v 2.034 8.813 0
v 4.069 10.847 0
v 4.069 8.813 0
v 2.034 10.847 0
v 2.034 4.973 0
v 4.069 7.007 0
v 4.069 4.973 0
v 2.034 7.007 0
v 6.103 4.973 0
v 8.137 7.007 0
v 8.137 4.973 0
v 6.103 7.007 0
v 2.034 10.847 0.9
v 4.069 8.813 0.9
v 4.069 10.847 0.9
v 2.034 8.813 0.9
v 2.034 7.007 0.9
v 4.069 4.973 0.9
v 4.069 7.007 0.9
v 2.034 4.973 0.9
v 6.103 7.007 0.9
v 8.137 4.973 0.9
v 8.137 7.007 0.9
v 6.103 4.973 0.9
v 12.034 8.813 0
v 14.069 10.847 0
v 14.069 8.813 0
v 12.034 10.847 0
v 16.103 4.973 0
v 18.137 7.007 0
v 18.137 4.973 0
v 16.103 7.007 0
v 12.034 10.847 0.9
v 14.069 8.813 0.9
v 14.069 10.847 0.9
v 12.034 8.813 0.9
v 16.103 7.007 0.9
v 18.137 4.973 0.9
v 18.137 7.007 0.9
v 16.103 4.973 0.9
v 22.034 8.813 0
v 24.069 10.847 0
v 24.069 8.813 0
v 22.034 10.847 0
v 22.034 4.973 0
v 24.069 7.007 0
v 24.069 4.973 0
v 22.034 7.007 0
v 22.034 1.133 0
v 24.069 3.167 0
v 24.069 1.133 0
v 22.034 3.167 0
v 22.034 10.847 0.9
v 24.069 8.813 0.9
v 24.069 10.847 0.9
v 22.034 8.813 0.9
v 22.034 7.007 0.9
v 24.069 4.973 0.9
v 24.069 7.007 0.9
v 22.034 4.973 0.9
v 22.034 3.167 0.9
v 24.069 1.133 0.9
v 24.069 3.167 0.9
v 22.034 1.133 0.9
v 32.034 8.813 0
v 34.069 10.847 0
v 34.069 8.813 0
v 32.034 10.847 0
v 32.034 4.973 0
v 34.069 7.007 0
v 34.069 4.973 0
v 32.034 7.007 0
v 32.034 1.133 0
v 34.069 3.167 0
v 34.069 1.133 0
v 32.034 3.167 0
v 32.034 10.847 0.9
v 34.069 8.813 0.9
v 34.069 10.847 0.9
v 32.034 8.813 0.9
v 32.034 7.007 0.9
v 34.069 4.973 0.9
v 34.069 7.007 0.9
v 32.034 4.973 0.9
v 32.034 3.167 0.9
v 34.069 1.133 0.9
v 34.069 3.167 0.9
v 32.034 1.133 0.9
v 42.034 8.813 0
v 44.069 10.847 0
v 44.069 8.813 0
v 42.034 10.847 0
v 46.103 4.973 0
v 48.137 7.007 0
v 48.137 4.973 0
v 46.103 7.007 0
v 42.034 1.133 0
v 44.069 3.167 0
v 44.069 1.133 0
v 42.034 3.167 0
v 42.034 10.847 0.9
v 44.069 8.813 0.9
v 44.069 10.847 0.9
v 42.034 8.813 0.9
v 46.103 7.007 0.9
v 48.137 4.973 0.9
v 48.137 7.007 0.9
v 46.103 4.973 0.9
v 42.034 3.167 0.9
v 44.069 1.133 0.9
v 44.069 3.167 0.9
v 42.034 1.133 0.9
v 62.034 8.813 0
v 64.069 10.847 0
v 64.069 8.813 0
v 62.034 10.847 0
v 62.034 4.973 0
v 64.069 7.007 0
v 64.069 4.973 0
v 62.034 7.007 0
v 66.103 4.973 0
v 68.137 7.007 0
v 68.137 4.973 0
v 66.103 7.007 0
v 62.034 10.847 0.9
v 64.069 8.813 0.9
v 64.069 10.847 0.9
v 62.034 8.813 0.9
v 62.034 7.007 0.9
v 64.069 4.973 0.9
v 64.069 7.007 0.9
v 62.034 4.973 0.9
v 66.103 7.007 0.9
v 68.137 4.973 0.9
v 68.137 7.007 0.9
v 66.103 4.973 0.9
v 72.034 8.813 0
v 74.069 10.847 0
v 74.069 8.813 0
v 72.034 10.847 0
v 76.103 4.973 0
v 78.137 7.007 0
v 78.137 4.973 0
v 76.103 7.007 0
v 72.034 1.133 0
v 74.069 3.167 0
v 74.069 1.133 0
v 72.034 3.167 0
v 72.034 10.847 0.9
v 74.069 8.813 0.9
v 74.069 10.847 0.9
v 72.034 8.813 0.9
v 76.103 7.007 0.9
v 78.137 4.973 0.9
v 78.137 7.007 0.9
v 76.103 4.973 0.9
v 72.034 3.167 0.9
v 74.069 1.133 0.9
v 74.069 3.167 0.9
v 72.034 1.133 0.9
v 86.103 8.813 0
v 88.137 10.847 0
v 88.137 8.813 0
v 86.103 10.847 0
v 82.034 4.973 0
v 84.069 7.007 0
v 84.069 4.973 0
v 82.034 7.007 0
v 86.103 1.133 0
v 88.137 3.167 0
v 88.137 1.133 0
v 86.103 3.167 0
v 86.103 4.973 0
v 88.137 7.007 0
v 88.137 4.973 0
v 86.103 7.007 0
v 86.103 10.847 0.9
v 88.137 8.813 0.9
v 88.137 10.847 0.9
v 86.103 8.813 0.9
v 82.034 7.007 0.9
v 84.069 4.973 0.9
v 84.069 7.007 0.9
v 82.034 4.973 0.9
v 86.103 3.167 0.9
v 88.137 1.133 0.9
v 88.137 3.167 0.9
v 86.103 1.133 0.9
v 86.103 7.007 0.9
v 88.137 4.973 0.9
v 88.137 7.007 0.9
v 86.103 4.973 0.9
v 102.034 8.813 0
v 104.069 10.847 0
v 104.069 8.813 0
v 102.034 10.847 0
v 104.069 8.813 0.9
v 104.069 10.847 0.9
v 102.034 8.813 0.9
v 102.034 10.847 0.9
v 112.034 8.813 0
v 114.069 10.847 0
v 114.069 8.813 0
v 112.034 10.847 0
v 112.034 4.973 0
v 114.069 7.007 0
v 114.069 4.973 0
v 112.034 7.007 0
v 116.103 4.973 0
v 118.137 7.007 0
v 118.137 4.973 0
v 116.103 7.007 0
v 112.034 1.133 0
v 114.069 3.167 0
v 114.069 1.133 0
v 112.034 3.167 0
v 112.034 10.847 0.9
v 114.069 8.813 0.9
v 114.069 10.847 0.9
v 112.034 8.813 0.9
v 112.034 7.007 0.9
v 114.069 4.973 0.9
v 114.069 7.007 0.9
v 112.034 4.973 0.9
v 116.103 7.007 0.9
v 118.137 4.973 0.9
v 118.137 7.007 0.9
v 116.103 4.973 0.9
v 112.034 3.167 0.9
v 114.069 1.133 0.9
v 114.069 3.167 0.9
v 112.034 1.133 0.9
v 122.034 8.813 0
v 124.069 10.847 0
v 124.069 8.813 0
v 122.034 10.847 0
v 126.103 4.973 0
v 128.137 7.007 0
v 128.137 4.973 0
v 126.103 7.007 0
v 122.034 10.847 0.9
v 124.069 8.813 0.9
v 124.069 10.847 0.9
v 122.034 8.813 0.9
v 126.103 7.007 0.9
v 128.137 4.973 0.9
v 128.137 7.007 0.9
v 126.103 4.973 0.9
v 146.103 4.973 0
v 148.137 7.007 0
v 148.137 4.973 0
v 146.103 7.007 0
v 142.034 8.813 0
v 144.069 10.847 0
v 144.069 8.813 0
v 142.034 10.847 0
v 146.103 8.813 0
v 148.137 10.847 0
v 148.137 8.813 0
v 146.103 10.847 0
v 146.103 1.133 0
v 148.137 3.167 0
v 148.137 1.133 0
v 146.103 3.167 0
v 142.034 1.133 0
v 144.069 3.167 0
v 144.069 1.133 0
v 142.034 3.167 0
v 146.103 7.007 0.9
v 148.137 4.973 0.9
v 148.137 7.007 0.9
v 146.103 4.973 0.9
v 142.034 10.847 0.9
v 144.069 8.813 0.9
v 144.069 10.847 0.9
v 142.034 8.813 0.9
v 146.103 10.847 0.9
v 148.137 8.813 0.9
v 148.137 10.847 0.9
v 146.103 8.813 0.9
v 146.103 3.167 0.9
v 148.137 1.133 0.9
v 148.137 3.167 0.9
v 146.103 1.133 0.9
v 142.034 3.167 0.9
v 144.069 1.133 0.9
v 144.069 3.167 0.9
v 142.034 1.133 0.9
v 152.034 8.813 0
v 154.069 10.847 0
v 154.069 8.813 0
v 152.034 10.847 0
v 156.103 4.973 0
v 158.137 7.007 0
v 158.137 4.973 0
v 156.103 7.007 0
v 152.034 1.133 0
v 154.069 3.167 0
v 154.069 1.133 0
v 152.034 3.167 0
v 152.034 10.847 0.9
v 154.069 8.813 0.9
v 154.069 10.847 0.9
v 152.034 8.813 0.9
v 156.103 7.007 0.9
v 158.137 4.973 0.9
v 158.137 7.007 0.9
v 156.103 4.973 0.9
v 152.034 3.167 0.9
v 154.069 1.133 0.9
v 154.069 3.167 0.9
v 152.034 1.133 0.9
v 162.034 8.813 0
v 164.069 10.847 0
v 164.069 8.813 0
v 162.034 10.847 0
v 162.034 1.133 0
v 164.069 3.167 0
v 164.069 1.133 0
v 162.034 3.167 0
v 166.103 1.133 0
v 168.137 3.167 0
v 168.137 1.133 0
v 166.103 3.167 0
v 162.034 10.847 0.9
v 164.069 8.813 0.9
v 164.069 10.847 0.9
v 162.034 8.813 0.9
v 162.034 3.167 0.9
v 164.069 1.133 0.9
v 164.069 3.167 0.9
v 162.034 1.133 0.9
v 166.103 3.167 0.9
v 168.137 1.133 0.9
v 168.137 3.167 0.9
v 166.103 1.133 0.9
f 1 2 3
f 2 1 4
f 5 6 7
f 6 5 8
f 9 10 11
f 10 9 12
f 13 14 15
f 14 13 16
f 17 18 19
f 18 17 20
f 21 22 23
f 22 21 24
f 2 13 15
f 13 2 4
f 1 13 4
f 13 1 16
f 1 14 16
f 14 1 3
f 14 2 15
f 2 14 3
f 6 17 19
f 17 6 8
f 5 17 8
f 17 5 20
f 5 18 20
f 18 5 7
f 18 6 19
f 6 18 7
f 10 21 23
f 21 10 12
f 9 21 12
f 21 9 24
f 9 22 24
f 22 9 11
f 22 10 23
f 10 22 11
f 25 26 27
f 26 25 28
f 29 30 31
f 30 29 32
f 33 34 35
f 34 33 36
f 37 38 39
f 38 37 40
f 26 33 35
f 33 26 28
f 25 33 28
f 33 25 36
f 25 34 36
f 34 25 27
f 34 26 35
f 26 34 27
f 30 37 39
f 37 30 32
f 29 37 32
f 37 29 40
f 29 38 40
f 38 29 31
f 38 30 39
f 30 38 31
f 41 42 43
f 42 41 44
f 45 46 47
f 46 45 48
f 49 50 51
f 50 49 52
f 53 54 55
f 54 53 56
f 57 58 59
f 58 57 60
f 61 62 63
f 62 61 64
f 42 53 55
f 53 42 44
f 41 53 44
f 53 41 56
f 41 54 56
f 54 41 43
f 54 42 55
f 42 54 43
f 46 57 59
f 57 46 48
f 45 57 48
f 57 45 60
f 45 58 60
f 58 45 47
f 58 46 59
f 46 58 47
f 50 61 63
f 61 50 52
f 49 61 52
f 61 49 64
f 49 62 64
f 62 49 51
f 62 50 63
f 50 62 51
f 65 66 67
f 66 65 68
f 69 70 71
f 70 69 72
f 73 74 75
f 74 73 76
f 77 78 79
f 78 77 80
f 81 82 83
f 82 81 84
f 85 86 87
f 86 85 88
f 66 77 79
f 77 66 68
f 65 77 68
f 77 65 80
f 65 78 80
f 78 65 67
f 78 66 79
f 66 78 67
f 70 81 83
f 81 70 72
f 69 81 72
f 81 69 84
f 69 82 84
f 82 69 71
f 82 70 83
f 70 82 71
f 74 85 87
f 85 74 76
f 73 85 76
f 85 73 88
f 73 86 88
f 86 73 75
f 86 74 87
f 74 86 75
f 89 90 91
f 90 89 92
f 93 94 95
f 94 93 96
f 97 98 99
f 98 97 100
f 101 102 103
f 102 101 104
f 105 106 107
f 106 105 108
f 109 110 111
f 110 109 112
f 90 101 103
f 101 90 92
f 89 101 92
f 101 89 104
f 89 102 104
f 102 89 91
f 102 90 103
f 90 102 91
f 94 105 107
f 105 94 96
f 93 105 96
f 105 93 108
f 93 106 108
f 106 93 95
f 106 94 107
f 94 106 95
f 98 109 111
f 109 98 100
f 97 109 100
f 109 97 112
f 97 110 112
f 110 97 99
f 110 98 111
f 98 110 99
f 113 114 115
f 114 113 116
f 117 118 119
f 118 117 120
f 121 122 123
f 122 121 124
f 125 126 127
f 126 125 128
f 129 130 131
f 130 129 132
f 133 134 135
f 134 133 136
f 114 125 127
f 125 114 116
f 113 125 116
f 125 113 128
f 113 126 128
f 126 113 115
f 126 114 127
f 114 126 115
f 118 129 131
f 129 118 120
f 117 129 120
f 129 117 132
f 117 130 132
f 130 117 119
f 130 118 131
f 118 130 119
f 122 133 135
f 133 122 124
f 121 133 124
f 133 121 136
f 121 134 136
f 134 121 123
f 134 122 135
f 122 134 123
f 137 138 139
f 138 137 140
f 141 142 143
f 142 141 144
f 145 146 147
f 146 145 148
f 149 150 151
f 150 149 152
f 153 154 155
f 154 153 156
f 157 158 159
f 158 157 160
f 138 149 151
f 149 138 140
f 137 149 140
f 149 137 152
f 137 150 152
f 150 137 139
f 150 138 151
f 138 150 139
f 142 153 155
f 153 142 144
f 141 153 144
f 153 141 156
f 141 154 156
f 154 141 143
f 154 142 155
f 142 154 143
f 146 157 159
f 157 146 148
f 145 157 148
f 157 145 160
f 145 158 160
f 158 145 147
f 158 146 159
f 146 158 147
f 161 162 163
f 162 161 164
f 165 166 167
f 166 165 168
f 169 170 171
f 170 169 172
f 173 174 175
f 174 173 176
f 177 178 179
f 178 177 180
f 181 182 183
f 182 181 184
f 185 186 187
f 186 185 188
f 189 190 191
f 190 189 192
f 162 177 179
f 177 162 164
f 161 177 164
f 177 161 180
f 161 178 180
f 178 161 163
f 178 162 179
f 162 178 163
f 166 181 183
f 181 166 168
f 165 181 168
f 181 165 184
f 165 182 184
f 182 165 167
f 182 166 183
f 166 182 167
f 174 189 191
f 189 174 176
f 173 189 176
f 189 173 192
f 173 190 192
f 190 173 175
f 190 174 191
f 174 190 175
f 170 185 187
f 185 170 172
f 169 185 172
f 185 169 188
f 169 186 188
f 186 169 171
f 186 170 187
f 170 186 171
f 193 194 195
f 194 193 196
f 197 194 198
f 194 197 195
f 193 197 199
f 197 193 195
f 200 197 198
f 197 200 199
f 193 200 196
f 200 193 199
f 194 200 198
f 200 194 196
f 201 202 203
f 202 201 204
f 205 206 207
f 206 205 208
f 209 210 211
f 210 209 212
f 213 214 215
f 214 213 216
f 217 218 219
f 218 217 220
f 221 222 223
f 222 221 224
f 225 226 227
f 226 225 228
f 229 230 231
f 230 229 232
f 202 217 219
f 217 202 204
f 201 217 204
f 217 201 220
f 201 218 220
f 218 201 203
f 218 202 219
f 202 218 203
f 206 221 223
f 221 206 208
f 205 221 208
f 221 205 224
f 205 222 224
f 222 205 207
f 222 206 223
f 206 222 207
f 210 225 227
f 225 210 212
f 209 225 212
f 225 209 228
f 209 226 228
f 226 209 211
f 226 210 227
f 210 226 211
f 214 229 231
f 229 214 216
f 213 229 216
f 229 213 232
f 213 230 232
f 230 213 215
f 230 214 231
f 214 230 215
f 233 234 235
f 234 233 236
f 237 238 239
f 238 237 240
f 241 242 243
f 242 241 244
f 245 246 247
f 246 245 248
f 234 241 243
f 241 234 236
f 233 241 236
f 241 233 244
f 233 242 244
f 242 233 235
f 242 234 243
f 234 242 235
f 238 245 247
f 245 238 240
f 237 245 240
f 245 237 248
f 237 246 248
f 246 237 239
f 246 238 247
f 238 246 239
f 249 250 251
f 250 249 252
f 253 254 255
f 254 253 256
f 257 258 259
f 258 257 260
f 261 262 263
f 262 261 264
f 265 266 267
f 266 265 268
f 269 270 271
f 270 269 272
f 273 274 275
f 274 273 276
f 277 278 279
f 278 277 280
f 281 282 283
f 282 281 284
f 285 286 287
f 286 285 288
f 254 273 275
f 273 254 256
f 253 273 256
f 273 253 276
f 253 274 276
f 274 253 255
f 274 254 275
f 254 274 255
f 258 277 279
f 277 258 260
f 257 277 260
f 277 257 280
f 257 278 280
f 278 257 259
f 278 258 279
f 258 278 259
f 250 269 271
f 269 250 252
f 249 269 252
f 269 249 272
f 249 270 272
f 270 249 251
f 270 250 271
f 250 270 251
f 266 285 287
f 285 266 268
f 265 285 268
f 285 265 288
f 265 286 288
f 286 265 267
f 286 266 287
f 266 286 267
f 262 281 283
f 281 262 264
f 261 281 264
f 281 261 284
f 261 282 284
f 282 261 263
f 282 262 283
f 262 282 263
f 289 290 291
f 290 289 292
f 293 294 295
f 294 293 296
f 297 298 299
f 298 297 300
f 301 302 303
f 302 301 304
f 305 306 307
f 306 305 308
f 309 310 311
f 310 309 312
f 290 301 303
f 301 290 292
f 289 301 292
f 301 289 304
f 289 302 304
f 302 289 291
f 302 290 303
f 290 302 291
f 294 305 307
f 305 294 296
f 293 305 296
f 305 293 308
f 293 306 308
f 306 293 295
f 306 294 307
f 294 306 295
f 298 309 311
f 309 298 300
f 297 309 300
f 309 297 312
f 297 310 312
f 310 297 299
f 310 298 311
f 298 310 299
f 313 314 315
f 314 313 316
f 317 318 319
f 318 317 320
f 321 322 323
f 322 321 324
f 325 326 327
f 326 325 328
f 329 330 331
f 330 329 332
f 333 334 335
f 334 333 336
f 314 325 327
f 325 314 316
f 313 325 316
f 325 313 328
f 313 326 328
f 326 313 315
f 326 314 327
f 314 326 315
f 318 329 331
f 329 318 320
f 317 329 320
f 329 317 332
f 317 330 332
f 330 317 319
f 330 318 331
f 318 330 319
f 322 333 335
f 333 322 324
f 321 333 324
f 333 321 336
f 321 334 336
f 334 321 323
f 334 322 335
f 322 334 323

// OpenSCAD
/*
        ENAMEL PROJECT - MELANIE BALJKO
        YORK UNIVERSITY
        
        CREATED BY:
        SHWETA DIXIT - 2017
        
        TITLE --- UNICODE BRAILLE ALPHABET CALL MODULE
        
        ****************************
        
        (Measurements in mm)
        
        
*/

function str2vec(str, v=[], i=0) =
	i == len(str) ? v :
	str2vec(str, concat(v, str[i]), i+1);

// General unicode braille alphabet module 
module braille_alphabet(height, size, alpha = " ")

{
    
    // Alphabet A
    if (alpha == "A")
    {
        linear_extrude(height)
        text("\u2801", font = "Segoe UI Symbol", size = size);
    }
    
    // Alphabet B
    if (alpha == "B")
    {
        linear_extrude(height)
        text("\u2803", font = "Segoe UI Symbol", size = size);
    }
    
    // Alphabet C
    if (alpha == "C")
    {
        linear_extrude(height)
        text("\u2809", font = "Segoe UI Symbol", size = size);
    }
    
    // Alphabet D
    if (alpha == "D")
    {
        linear_extrude(height)
        text("\u2819", font = "Segoe UI Symbol", size = size);
    }
    
    // Alphabet E
    if (alpha == "E")
    {
        linear_extrude(height)
        text("\u2811", font = "Segoe UI Symbol", size = size);
    }
    
    // Alphabet F
    if (alpha == "F")
    {
        linear_extrude(height)
        text("\u280B", font = "Segoe UI Symbol", size = size);
    }
    
    // Alphabet G
    if (alpha == "G")
    {
        linear_extrude(height)
        text("\u281B", font = "Segoe UI Symbol", size = size);
    }
    
    // Alphabet H
    if (alpha == "H")
    {
        linear_extrude(height)
        text("\u2813", font = "Segoe UI Symbol", size = size);
    }
    
    // Alphabet I
    if (alpha == "I")
    {
        linear_extrude(height)
        text("\u280A", font = "Segoe UI Symbol", size = size);
    }
    
    // Alphabet J
    if (alpha == "J")
    {
        linear_extrude(height)
        text("\u281A", font = "Segoe UI Symbol", size = size);
    }
    
    // Alphabet K
    if (alpha == "K")
    {
        linear_extrude(height)
        text("\u2805", font = "Segoe UI Symbol", size = size);
    }
    
    // Alphabet L
    if (alpha == "L")
    {
        linear_extrude(height)
        text("\u2807", font = "Segoe UI Symbol", size = size);
    }
    
    // Alphabet M
    if (alpha == "M")
    {
        linear_extrude(height)
        text("\u280D", font = "Segoe UI Symbol", size = size);
    }
    
    // Alphabet N
    if (alpha == "N")
    {
        linear_extrude(height)
        text("\u281D", font = "Segoe UI Symbol", size = size);
    }
    
    // Alphabet O
    if (alpha == "O")
    {
        linear_extrude(height)
        text("\u2815", font = "Segoe UI Symbol", size = size);
    }
    
    // Alphabet P
    if (alpha == "P")
    {
        linear_extrude(height)
        text("\u280F", font = "Segoe UI Symbol", size = size);
    }
    
    // Alphabet Q
    if (alpha == "Q")
    {
        linear_extrude(height)
        text("\u281F", font = "Segoe UI Symbol", size = size);
    }
    
    // Alphabet R
    if (alpha == "R")
    {
        linear_extrude(height)
        text("\u2817", font = "Segoe UI Symbol", size = size);
    }
    
    // Alphabet S
    if (alpha == "S")
    {
        linear_extrude(height)
        text("\u280E", font = "Segoe UI Symbol", size = size);
    }
    
    // Alphabet T
    if (alpha == "T")
    {
        linear_extrude(height)
        text("\u281E", font = "Segoe UI Symbol", size = size);
    }
    
    // Alphabet U
    if (alpha == "U")
    {
        linear_extrude(height)
        text("\u2825", font = "Segoe UI Symbol", size = size);
    }
    
    // Alphabet V
    if (alpha == "V")
    {
        linear_extrude(height)
        text("\u2827", font = "Segoe UI Symbol", size = size);
    }
    
    // Alphabet W
    if (alpha == "W")
    {
        linear_extrude(height)
        text("\u283A", font = "Segoe UI Symbol", size = size);
    }
    
    // Alphabet X
    if (alpha == "X")
    {
        linear_extrude(height)
        text("\u282D", font = "Segoe UI Symbol", size = size);
    }
    
    // Alphabet Y
    if (alpha == "Y")
    {
        linear_extrude(height)
        text("\u283D", font = "Segoe UI Symbol", size = size);
    }
    
    // Alphabet Z
    if (alpha == "Z")
    {
        linear_extrude(height)
        text("\u2835", font = "Segoe UI Symbol", size = size);
    }
    
    echo(alpha);
}



// ISO STANDARD UNICODE BRAILLE ALPHABET CALL MODULE - ISO Standard height = 0.9 mm
module iso_std_braille_alpha(alphabet = " ", size)
{
    vecChar = str2vec(alphabet);
    x = 0;
    y = 0;
    z = 0;
    
  
    for (alpha = [0:1:len(vecChar)-1])
        {
            x = alpha * 10;
            //echo(alpha);
            translate([x,y,z])
            {
                braille_alphabet(0.9, size, vecChar[alpha]);
            }
               
            echo(x);
            
            
        }
}



iso_std_braille_alpha("HELLO HOW ARE YOU", 10);
